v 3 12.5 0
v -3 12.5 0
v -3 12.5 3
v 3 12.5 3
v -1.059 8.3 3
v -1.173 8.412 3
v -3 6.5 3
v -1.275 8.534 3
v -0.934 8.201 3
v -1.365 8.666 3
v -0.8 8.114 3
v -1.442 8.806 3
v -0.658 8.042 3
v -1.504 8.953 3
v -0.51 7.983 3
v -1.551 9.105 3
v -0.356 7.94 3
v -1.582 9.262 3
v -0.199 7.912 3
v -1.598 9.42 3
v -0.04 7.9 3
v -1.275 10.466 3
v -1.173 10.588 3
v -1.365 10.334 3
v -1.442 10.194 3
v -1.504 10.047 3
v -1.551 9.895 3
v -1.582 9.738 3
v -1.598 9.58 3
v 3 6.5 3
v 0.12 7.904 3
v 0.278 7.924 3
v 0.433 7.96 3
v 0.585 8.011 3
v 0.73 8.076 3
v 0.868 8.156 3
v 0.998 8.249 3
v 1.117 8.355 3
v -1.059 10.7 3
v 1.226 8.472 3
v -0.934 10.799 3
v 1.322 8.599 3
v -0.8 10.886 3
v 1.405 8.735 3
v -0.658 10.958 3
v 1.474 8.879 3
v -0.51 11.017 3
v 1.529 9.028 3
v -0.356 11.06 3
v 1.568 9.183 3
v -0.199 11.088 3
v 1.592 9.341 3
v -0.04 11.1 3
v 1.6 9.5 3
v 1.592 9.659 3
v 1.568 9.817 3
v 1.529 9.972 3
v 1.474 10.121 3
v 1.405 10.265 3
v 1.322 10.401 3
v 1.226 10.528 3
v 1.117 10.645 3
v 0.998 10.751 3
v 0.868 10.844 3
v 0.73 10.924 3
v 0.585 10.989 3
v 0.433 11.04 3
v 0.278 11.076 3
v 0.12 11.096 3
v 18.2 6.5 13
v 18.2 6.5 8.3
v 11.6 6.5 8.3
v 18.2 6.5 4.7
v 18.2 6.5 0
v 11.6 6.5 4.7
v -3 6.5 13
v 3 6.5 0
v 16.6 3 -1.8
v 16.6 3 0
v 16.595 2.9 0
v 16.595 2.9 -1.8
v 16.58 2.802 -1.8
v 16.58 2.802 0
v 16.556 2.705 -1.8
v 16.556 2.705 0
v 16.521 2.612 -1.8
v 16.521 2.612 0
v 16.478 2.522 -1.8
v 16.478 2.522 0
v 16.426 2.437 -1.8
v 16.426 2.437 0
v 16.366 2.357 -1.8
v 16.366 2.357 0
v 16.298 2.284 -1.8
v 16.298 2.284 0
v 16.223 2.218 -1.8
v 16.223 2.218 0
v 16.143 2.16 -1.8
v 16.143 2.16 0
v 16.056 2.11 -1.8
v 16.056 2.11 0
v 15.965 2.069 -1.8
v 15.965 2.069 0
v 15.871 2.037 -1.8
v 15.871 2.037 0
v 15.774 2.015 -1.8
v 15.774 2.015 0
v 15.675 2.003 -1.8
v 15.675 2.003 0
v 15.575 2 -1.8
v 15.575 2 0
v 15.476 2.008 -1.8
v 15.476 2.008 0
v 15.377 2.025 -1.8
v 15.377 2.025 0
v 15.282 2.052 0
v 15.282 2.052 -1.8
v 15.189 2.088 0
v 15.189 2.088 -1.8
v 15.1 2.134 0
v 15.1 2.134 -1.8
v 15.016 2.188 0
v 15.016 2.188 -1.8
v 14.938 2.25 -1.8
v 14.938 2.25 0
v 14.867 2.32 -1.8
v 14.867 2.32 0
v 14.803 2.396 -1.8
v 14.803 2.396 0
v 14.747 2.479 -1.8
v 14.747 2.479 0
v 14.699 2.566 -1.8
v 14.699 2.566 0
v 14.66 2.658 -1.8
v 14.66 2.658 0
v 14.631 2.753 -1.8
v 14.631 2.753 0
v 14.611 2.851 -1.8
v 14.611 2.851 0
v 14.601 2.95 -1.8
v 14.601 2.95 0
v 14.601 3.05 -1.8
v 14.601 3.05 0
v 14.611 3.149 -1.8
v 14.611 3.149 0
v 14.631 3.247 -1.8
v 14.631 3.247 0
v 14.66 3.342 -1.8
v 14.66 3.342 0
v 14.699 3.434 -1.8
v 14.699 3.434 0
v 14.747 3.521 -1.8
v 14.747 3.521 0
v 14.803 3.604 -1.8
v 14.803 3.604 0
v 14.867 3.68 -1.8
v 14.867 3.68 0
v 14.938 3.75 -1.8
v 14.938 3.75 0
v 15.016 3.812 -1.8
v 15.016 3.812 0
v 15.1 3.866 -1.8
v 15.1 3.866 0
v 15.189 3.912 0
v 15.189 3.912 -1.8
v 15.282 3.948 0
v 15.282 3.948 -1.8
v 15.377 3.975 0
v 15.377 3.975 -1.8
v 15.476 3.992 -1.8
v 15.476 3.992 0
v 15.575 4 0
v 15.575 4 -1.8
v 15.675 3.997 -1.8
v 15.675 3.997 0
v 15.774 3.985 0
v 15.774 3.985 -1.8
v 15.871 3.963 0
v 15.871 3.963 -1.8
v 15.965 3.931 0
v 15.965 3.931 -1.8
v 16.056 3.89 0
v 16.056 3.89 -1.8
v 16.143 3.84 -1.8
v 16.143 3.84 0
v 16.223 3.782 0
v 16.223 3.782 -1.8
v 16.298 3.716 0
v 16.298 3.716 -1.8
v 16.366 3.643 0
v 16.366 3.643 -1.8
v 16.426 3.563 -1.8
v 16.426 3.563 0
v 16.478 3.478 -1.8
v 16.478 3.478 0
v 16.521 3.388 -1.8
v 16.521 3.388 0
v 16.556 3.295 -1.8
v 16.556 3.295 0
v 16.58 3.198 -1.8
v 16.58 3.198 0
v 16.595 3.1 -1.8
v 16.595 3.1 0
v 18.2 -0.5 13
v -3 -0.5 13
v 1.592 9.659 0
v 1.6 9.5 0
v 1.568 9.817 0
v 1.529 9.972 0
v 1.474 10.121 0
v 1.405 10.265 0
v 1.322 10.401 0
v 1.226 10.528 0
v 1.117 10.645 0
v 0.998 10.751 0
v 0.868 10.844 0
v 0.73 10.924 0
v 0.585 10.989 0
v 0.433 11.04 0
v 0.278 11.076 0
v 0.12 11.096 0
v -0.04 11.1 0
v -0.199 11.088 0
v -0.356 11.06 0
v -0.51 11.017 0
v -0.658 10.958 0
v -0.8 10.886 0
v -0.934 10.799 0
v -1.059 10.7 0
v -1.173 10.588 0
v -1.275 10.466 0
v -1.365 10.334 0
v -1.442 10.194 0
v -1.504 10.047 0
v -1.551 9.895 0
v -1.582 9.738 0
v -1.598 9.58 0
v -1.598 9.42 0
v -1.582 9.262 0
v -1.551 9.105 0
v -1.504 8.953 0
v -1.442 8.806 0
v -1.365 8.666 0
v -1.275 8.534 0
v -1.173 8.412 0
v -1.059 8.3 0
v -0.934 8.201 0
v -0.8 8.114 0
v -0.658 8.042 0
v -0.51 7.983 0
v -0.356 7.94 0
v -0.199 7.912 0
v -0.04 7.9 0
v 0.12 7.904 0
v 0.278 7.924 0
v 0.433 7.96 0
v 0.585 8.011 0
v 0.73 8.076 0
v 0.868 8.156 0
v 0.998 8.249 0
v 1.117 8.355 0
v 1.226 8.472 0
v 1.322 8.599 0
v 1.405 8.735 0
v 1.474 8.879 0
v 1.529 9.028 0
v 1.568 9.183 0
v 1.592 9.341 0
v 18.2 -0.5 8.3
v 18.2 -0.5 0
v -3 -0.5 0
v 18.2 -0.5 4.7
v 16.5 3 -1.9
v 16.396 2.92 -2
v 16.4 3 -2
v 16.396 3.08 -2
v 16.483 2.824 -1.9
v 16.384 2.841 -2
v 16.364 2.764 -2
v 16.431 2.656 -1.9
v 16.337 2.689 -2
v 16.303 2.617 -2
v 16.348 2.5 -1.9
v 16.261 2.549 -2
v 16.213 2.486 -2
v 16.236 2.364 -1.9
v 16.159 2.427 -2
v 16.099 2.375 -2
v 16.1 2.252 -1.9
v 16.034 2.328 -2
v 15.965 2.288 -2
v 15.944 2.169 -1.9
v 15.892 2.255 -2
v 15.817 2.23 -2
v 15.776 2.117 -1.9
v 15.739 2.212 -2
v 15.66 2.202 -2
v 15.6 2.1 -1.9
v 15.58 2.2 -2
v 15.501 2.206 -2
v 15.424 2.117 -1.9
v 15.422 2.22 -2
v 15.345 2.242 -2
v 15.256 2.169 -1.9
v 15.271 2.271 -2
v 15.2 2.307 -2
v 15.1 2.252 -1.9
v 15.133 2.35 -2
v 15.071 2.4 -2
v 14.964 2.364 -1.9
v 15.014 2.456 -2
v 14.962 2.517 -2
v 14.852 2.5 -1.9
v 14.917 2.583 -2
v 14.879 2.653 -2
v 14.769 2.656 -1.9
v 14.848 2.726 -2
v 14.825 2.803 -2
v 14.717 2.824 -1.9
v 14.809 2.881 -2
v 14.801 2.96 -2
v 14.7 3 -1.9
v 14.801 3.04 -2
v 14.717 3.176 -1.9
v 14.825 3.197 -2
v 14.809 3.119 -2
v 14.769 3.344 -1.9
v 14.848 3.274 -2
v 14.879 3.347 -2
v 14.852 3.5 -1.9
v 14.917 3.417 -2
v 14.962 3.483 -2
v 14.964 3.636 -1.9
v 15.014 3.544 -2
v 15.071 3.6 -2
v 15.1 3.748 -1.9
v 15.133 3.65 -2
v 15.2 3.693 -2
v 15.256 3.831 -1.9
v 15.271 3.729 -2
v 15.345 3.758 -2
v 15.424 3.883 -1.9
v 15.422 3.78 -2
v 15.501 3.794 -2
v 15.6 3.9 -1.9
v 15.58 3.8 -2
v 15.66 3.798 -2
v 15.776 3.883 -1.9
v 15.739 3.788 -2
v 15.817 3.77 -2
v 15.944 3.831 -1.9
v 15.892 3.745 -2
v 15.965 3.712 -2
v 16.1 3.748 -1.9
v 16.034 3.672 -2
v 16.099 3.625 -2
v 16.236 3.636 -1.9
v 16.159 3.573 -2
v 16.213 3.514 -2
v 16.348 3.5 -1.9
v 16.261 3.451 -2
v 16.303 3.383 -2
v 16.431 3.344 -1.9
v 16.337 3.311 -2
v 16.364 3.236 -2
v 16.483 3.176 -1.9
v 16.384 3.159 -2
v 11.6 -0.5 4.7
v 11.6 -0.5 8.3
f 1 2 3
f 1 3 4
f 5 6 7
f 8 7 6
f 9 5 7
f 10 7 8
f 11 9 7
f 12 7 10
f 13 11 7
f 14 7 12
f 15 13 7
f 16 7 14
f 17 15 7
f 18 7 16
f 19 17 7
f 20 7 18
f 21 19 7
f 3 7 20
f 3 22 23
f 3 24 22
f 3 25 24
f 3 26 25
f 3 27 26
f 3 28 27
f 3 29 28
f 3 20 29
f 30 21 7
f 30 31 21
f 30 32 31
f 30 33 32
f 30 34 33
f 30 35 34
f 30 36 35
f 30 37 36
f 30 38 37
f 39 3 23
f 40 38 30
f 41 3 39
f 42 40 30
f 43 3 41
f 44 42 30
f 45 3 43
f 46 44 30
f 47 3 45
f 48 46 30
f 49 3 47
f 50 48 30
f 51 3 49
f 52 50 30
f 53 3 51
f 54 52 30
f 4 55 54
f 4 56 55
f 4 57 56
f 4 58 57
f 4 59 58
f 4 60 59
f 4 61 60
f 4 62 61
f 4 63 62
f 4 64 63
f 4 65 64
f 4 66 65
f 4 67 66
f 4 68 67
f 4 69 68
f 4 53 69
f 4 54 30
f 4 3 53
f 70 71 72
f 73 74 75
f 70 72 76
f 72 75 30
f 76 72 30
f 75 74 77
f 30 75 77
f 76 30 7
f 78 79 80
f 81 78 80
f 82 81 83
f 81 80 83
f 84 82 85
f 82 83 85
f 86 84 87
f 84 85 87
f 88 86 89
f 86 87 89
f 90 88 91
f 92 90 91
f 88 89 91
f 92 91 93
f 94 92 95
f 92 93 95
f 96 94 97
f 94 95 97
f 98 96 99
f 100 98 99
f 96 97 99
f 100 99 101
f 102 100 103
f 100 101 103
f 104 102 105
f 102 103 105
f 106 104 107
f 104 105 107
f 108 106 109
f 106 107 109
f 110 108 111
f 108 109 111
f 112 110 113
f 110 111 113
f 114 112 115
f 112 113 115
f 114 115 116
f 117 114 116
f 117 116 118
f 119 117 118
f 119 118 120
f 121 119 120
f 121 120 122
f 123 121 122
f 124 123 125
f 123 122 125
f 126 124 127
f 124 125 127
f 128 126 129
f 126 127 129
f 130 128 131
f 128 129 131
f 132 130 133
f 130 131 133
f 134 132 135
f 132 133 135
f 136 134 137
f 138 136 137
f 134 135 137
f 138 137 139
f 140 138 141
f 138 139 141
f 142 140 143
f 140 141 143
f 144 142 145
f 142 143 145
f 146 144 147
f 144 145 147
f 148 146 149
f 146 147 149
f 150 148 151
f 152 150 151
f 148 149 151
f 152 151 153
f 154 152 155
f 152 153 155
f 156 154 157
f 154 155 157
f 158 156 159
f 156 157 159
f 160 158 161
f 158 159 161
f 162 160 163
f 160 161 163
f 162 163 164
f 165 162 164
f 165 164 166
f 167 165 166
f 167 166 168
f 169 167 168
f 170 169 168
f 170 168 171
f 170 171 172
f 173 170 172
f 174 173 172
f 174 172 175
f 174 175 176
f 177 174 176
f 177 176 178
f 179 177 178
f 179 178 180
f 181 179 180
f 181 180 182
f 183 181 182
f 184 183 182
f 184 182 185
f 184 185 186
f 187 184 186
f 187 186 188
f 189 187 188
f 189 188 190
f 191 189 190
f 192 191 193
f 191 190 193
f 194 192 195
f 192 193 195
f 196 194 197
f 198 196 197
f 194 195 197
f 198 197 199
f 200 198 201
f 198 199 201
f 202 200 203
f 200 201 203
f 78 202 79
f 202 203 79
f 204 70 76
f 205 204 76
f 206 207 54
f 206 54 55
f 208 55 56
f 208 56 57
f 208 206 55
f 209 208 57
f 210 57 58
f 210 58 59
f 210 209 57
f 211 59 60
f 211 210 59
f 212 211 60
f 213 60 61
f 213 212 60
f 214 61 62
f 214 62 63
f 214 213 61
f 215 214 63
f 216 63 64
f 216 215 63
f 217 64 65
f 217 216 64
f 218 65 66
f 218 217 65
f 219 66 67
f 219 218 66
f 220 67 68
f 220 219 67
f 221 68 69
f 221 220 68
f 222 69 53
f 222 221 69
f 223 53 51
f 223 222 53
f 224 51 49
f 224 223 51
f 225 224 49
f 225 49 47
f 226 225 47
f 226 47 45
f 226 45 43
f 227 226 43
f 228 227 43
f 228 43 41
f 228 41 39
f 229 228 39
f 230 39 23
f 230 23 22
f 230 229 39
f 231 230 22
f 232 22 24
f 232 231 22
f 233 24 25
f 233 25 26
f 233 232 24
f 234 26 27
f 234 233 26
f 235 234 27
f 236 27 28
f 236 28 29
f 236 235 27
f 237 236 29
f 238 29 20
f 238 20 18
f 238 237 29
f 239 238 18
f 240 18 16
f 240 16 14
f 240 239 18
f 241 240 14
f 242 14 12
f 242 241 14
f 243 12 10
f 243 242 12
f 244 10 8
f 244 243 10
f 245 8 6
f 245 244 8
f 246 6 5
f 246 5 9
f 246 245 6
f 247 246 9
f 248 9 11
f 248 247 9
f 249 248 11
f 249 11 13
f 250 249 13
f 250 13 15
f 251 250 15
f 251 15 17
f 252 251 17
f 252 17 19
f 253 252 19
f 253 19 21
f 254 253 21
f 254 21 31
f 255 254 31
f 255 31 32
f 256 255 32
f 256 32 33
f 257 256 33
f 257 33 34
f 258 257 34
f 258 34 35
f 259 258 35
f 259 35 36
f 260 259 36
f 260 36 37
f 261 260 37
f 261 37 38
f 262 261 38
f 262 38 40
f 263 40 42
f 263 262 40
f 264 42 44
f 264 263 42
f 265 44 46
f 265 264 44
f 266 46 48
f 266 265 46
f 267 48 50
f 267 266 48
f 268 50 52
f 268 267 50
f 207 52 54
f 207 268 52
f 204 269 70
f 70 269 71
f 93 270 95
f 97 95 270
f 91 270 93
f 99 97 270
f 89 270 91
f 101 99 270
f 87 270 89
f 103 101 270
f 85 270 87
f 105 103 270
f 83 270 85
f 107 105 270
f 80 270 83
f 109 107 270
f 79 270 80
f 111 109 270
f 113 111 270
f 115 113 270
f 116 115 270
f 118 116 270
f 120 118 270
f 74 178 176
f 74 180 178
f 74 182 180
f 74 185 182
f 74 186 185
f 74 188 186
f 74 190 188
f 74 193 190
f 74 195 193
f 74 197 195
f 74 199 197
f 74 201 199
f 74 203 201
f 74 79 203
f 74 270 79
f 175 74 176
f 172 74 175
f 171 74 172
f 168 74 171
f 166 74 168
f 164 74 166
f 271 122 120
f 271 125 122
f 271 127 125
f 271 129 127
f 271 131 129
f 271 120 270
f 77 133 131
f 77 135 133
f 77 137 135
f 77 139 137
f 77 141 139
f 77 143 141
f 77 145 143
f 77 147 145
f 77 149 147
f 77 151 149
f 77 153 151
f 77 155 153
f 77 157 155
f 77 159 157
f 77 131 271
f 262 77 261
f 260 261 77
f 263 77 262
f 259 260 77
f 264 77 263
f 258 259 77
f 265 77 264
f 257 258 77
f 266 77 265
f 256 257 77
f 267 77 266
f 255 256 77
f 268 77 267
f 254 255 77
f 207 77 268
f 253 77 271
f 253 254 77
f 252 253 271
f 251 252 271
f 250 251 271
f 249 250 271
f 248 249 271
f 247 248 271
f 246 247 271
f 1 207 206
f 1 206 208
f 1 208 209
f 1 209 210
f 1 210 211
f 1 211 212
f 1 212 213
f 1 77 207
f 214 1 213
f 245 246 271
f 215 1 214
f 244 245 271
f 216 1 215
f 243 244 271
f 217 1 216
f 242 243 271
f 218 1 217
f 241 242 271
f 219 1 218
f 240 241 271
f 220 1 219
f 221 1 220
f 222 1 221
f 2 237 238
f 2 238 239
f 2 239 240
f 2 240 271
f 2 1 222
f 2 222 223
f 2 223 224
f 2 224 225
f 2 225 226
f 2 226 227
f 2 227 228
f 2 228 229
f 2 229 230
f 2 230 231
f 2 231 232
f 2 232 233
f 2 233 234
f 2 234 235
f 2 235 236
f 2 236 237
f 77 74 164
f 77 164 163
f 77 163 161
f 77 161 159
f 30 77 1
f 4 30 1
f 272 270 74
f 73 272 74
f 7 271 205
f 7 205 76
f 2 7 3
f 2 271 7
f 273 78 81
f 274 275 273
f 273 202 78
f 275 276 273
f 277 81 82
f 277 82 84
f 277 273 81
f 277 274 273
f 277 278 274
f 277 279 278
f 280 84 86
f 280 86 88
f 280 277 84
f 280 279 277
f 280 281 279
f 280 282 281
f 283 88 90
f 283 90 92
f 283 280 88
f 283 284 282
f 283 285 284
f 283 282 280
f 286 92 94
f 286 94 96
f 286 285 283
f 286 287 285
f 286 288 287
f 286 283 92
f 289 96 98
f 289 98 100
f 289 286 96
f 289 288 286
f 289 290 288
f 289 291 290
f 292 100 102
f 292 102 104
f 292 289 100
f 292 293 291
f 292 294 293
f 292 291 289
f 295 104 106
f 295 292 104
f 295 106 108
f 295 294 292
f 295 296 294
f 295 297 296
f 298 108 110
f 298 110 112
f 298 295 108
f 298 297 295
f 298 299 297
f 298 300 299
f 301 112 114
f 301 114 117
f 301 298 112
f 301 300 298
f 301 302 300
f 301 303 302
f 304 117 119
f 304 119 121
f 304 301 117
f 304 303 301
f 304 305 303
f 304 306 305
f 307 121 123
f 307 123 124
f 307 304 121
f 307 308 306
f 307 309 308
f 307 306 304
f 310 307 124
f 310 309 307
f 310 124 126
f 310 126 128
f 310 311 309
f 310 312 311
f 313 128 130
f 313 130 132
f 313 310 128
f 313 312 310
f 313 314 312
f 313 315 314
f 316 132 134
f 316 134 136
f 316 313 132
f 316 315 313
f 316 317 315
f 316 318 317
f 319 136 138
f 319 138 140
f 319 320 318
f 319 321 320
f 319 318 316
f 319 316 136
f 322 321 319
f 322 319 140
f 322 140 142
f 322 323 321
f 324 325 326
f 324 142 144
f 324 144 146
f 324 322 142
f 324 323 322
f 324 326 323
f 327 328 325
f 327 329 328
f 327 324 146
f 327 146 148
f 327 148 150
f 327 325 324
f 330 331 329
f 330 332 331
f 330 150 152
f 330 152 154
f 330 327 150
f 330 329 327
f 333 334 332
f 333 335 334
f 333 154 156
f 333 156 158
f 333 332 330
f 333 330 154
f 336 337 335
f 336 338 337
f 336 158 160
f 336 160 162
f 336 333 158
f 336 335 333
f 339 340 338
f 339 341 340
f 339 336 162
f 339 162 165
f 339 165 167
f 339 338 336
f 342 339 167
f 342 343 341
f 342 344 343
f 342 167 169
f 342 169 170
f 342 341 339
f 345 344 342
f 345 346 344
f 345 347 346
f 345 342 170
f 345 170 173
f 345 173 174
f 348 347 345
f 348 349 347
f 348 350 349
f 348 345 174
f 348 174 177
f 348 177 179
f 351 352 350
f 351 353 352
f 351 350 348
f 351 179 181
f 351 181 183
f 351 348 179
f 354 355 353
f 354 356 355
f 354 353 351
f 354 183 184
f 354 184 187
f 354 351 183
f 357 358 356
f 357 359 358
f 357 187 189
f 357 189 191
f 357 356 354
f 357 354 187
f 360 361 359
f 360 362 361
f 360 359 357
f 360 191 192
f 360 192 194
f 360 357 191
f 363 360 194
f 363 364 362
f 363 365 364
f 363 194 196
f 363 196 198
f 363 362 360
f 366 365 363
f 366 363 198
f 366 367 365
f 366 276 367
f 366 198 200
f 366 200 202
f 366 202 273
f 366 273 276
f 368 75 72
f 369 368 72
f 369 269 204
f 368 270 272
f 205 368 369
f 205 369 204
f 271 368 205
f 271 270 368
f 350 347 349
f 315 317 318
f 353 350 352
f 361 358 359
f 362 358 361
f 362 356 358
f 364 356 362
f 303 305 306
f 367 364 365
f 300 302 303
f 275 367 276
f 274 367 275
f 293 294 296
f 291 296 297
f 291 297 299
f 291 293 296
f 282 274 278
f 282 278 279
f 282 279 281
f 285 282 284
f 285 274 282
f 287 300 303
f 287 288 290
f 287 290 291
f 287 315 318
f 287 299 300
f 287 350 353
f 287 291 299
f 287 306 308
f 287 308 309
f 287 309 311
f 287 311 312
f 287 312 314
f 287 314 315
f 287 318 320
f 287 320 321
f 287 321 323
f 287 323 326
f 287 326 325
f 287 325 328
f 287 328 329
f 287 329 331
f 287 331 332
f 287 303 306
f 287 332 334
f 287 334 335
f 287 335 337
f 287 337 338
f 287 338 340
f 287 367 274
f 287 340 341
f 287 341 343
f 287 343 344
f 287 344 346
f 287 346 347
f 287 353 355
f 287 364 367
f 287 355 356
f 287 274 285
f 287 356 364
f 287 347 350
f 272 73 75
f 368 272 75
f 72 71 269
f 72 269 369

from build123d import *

# Parameters (mm, degrees)
SKETCH_1_W          = 6
SKETCH_1_H          = 13
SKETCH_1_R          = 1.6
EXTRUDE_1_DEPTH     = 3
SKETCH_3_W          = 21.2
SKETCH_3_H          = 7
EXTRUDE_3_DEPTH     = 13
SKETCH_4_W          = 10.937812939
SKETCH_4_H          = 3.6
CUT_EXTRUDE_1_DEPTH = 13.2
SKETCH_6_R          = 1
EXTRUDE_4_DEPTH     = 2
CHAMFER_1_SIZE      = 0.2


with BuildPart() as part:
    # 草图1 → 拉伸1 (new body)
    with BuildSketch(Plane.XY):
        with Locations((0, 6)):
            Rectangle(SKETCH_1_W, SKETCH_1_H)
        with Locations((0, 9.5)):
            Circle(SKETCH_1_R, mode=Mode.SUBTRACT)
    extrude(amount=EXTRUDE_1_DEPTH)

    # 草图3 → 拉伸3 (add)
    with BuildSketch(Plane(origin=(0, 0, 0), x_dir=(-1, 0, 0), z_dir=(0, 0, -1))):
        with Locations((-7.6, 3)):
            Rectangle(SKETCH_3_W, SKETCH_3_H)
    extrude(amount=-EXTRUDE_3_DEPTH)

    # 草图4 → 切除-拉伸1 (cut)
    with BuildSketch(Plane(origin=(0, 6.5, 0), x_dir=(-1, 0, 0), z_dir=(0, 1, 0))):
        with Locations((-17.068906469, 6.5)):
            Rectangle(SKETCH_4_W, SKETCH_4_H)
    extrude(amount=-CUT_EXTRUDE_1_DEPTH, mode=Mode.SUBTRACT)

    # 草图6 → 拉伸4 (add)
    with BuildSketch(Plane(origin=(0, 0, 0), x_dir=(-1, 0, 0), z_dir=(0, 0, -1))):
        with Locations(Location((-15.6, 3, 0), (0, 0, 180))):
            Circle(SKETCH_6_R)
    extrude(amount=EXTRUDE_4_DEPTH)

    # 倒角1
    chamfer_1_edges = [part.edges().sort_by_distance(p)[0] for p in [
        (14.6, 3, -2),
    ]]
    chamfer(chamfer_1_edges, length=CHAMFER_1_SIZE)


solid = part.part
